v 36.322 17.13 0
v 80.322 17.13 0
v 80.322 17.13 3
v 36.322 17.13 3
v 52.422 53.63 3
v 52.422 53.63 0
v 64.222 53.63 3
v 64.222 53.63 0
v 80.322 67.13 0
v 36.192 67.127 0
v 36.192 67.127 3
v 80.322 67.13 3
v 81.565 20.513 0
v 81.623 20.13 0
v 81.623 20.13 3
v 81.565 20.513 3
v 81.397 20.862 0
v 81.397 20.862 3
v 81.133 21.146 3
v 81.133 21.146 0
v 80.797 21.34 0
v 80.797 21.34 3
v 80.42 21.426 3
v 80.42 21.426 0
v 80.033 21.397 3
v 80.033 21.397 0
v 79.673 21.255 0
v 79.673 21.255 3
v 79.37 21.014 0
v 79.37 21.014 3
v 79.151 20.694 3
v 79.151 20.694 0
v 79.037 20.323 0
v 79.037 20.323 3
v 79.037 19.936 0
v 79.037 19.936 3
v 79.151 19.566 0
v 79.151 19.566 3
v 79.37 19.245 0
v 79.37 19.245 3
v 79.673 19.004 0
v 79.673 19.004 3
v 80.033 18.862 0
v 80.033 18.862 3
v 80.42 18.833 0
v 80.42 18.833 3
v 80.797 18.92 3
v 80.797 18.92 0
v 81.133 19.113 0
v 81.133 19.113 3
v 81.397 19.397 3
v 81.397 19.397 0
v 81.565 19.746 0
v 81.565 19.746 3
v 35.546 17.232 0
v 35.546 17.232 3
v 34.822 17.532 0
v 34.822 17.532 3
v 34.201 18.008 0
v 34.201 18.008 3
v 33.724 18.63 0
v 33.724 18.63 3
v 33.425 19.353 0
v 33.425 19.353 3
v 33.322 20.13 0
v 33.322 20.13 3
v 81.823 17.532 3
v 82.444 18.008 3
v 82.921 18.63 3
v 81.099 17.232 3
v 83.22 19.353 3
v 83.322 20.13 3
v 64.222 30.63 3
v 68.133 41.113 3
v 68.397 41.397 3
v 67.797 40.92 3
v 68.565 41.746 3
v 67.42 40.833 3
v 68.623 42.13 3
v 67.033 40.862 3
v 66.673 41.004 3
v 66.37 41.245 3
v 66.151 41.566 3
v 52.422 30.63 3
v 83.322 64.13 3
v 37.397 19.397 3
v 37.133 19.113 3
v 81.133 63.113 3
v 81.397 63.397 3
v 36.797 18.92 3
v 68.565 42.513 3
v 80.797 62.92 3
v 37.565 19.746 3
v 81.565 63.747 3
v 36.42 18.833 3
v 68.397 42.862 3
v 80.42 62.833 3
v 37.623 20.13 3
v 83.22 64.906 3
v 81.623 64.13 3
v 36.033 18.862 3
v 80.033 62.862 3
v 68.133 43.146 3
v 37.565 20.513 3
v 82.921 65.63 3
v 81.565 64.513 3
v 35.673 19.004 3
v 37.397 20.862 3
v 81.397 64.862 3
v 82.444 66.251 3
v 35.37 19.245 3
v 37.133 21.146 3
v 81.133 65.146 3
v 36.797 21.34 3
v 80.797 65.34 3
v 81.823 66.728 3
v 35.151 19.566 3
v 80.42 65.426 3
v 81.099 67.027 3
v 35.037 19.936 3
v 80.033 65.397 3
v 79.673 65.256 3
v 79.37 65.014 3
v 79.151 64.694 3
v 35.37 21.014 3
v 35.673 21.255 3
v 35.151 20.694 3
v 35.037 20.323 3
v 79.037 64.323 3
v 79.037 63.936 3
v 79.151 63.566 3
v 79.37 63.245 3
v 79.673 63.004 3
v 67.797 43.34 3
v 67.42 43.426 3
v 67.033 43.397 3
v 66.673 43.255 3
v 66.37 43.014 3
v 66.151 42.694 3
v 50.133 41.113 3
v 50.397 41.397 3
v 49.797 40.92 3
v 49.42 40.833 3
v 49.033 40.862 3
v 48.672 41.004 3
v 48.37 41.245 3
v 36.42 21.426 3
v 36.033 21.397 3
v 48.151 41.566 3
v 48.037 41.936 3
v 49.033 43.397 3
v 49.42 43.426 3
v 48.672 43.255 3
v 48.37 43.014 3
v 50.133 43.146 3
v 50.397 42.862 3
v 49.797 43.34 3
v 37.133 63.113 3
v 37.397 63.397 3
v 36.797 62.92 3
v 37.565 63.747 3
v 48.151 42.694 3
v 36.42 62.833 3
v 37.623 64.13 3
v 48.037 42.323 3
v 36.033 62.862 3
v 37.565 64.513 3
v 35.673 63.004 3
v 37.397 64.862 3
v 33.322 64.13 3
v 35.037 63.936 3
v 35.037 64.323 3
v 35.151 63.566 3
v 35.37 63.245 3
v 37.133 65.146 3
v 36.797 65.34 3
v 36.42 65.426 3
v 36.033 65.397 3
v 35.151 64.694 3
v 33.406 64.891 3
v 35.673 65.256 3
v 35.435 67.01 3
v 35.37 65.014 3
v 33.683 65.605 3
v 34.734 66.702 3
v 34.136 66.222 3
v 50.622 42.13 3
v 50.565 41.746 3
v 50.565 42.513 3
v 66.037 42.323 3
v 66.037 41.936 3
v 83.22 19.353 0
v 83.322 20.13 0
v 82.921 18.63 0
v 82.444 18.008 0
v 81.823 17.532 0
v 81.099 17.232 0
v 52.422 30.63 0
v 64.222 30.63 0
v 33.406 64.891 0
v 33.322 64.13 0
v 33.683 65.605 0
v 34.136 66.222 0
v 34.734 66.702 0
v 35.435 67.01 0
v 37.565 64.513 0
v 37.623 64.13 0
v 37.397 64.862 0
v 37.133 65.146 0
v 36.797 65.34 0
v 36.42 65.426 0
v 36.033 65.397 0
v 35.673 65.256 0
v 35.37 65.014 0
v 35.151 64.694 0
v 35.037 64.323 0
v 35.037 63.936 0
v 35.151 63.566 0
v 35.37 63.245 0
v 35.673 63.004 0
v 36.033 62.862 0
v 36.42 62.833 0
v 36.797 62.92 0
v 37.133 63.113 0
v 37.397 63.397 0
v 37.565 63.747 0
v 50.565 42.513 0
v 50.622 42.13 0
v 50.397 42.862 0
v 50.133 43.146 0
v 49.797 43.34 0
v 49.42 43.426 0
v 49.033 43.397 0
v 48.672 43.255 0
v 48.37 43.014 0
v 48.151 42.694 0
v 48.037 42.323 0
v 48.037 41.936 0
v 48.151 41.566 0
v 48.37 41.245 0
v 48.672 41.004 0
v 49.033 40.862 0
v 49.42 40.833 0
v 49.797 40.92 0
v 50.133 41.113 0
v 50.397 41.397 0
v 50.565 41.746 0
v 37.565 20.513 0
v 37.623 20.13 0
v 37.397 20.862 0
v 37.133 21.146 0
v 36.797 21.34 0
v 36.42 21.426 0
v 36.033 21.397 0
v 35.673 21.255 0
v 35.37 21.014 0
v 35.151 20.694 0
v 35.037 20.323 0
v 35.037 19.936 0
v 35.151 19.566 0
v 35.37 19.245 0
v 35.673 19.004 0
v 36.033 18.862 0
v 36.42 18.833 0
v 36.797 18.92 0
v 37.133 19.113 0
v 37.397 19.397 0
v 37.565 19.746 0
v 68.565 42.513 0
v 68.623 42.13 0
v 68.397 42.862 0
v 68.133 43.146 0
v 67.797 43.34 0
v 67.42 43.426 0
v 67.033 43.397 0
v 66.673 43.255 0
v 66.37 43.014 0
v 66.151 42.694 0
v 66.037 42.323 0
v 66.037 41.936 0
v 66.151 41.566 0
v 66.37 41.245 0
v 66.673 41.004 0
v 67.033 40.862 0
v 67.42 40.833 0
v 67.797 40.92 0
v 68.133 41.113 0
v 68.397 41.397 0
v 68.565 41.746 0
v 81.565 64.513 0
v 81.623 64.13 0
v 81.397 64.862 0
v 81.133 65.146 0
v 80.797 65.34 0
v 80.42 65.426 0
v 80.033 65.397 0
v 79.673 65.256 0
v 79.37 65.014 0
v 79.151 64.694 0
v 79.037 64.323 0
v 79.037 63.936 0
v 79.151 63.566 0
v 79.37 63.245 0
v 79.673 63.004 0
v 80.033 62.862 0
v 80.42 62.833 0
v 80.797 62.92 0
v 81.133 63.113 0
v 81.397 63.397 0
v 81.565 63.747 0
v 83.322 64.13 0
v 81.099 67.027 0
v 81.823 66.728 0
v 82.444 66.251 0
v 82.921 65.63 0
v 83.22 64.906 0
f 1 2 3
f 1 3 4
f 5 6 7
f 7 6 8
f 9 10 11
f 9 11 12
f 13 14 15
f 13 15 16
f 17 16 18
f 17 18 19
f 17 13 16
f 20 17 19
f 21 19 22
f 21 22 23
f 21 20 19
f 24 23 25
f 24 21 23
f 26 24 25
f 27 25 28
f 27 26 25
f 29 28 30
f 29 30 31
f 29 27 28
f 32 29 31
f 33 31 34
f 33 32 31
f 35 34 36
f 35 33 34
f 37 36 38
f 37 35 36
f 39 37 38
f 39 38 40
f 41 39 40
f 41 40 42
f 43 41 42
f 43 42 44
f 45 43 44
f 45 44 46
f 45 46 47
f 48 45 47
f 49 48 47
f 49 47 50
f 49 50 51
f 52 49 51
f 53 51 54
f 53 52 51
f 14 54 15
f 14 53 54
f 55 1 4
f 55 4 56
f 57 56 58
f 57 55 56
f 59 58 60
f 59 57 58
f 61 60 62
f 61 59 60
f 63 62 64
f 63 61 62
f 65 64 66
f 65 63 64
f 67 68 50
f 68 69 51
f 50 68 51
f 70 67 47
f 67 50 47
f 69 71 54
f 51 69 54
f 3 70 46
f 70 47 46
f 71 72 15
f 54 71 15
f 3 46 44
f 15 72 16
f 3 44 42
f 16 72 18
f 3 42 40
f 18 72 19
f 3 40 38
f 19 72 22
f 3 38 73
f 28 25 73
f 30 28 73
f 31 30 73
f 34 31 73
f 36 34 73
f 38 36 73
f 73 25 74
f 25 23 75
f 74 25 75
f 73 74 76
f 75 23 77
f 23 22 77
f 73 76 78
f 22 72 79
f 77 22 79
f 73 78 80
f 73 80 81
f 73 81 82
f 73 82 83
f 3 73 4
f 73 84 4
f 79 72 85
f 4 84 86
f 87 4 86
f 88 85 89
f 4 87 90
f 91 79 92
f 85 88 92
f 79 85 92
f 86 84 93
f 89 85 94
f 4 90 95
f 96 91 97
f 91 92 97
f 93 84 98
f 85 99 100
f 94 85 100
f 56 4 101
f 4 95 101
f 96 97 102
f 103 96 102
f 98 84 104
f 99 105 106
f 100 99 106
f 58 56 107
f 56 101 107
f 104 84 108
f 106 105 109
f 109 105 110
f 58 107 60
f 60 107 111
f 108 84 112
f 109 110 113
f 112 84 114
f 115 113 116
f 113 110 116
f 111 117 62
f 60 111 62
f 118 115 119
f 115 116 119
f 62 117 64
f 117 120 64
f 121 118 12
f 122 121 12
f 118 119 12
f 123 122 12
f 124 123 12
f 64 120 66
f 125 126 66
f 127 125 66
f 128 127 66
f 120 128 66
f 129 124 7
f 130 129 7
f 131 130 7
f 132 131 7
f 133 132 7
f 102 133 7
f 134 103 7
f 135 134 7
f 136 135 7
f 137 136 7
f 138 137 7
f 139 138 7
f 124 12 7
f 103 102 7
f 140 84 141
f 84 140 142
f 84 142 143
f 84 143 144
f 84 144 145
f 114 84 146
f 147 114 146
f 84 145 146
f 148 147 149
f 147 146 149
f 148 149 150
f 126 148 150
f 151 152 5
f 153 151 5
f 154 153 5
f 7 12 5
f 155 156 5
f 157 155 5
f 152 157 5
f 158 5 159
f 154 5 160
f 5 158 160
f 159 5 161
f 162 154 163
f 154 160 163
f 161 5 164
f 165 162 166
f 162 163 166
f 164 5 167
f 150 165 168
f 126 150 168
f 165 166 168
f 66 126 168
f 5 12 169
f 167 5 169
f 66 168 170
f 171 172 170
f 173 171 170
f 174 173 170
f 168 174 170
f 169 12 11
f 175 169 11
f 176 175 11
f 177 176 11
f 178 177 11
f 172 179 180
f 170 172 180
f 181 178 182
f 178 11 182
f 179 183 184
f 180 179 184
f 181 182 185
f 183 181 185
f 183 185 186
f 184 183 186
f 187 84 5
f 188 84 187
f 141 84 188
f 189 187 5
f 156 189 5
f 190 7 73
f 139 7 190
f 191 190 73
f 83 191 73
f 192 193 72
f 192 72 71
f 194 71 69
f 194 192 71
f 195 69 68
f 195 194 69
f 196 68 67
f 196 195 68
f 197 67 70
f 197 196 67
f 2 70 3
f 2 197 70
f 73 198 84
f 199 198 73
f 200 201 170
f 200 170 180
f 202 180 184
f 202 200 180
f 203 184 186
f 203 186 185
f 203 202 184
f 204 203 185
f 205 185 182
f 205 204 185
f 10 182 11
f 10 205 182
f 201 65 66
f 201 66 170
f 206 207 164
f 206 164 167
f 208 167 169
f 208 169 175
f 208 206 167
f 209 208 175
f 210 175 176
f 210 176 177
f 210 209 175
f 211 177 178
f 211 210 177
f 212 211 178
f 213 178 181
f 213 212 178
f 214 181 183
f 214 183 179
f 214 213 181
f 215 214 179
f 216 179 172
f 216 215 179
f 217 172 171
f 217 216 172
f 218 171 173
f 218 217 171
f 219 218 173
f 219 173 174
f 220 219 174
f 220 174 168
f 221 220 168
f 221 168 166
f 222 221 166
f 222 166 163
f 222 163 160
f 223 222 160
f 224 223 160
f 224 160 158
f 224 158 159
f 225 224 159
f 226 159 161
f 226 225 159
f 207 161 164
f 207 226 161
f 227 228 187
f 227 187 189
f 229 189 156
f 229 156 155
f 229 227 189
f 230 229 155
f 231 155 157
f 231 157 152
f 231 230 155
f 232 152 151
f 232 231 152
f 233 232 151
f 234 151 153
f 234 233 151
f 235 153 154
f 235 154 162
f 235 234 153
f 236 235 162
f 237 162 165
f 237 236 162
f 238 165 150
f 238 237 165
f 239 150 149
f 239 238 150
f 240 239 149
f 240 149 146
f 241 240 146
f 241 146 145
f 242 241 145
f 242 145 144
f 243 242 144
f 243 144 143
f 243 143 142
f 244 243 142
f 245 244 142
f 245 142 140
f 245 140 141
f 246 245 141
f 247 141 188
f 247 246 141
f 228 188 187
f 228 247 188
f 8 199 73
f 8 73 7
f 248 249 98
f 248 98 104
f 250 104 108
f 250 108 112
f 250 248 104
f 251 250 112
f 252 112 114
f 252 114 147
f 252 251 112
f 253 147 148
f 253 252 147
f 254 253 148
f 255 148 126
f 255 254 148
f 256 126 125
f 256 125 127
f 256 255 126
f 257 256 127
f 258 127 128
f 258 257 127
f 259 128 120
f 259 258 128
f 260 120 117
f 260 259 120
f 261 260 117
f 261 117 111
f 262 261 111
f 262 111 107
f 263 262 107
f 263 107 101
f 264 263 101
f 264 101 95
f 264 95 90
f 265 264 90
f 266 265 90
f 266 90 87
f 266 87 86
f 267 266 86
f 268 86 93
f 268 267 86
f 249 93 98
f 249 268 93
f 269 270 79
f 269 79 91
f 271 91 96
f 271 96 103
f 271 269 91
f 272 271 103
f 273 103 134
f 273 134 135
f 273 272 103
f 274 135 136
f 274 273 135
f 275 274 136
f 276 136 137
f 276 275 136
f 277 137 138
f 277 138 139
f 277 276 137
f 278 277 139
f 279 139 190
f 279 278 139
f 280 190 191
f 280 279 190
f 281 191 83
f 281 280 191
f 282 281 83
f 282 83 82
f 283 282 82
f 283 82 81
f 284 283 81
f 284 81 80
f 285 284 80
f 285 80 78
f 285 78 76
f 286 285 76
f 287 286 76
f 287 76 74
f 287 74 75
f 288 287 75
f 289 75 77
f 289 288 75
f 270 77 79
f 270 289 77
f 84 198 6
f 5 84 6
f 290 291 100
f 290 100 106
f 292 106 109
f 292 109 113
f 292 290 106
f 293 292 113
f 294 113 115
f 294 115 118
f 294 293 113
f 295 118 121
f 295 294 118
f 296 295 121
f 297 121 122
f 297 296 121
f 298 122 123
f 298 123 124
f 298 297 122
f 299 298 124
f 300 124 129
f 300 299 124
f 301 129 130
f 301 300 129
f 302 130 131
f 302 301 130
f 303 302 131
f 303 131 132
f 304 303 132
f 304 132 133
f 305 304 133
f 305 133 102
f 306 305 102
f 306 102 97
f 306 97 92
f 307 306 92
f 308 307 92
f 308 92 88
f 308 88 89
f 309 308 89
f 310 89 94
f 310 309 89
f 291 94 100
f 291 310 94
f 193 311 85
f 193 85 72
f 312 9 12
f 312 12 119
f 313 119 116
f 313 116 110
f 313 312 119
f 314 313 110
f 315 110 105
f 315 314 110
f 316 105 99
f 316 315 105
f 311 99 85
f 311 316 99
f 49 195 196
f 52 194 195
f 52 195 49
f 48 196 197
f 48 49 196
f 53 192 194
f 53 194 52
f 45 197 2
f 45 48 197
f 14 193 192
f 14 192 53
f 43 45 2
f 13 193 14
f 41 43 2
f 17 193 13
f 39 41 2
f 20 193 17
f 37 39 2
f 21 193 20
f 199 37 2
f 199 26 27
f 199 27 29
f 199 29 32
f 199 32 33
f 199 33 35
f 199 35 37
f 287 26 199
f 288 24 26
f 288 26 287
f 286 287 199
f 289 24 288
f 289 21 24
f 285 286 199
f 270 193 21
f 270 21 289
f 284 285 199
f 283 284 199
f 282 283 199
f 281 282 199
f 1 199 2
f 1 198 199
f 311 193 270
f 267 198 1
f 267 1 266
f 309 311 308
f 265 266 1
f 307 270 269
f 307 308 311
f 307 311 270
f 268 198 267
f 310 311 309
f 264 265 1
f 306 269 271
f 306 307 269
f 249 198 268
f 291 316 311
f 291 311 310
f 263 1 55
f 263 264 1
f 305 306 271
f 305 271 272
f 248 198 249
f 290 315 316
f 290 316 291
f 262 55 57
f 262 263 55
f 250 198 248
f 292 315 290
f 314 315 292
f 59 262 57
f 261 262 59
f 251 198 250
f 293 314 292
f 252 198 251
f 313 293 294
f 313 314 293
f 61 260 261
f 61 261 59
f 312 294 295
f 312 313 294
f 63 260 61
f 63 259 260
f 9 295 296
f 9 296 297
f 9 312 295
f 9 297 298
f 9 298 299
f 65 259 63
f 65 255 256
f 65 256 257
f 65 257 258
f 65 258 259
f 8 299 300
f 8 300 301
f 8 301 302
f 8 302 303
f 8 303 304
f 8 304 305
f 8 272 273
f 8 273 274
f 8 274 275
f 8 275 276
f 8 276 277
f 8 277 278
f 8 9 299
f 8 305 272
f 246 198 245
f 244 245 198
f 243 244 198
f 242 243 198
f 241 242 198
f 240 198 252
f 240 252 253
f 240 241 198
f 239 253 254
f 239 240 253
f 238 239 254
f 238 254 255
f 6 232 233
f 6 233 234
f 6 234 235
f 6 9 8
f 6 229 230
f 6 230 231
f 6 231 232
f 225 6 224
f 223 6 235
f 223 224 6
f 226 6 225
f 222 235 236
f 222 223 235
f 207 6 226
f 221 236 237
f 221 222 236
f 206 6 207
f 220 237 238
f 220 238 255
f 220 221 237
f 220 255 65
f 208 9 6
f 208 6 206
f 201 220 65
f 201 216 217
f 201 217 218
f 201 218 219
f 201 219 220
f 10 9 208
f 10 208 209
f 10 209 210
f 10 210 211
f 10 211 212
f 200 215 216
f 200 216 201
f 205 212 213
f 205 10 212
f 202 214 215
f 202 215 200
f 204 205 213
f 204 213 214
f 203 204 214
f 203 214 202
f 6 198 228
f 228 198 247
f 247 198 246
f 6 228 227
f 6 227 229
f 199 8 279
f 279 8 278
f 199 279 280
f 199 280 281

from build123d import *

# Parameters (mm, degrees)
MODEL_R             = 1.300000002
MODEL_R_2           = 1.299950005
MODEL_R_3           = 1.299950001
MODEL_W             = 11.8
MODEL_H             = 23
BOSS_EXTRUDE1_DEPTH = 3


with BuildPart() as part:
    # Model → Boss-Extrude1 (new body)
    with BuildSketch(Plane.XY):
        with BuildLine():
            Line((33.3225, 20.129700001), (33.3225, 64.129600001))
            ThreePointArc((33.3225, 64.129600001), (34.136296645, 66.222490163), (36.19171658, 67.126759536))
            Line((36.19171658, 67.126759536), (80.3225, 67.129600001))
            ThreePointArc((80.3225, 67.129600001), (82.4438375, 66.250937501), (83.3225, 64.129600001))
            Line((83.3225, 64.129600001), (83.3225, 20.129700001))
            ThreePointArc((83.3225, 20.129700001), (82.443835355, 18.008335356), (80.3225, 17.129600001))
            Line((80.3225, 17.129600001), (36.3225, 17.129600001))
            ThreePointArc((36.3225, 17.129600001), (34.201114643, 18.008285356), (33.3225, 20.129700001))
        make_face()
        with Locations((36.322500002, 64.129699999)):
            Circle(MODEL_R, mode=Mode.SUBTRACT)
        with Locations((80.322500002, 64.129699999)):
            Circle(MODEL_R, mode=Mode.SUBTRACT)
        with Locations((67.322549996, 42.129649997)):
            Circle(MODEL_R_2, mode=Mode.SUBTRACT)
        with Locations((49.32245, 42.129650001)):
            Circle(MODEL_R_3, mode=Mode.SUBTRACT)
        with Locations((36.322549996, 20.129649997)):
            Circle(MODEL_R_2, mode=Mode.SUBTRACT)
        with Locations((80.322549996, 20.129649997)):
            Circle(MODEL_R_2, mode=Mode.SUBTRACT)
        with Locations((58.3225, 42.129600001)):
            Rectangle(MODEL_W, MODEL_H, mode=Mode.SUBTRACT)
    extrude(amount=BOSS_EXTRUDE1_DEPTH)


solid = part.part
